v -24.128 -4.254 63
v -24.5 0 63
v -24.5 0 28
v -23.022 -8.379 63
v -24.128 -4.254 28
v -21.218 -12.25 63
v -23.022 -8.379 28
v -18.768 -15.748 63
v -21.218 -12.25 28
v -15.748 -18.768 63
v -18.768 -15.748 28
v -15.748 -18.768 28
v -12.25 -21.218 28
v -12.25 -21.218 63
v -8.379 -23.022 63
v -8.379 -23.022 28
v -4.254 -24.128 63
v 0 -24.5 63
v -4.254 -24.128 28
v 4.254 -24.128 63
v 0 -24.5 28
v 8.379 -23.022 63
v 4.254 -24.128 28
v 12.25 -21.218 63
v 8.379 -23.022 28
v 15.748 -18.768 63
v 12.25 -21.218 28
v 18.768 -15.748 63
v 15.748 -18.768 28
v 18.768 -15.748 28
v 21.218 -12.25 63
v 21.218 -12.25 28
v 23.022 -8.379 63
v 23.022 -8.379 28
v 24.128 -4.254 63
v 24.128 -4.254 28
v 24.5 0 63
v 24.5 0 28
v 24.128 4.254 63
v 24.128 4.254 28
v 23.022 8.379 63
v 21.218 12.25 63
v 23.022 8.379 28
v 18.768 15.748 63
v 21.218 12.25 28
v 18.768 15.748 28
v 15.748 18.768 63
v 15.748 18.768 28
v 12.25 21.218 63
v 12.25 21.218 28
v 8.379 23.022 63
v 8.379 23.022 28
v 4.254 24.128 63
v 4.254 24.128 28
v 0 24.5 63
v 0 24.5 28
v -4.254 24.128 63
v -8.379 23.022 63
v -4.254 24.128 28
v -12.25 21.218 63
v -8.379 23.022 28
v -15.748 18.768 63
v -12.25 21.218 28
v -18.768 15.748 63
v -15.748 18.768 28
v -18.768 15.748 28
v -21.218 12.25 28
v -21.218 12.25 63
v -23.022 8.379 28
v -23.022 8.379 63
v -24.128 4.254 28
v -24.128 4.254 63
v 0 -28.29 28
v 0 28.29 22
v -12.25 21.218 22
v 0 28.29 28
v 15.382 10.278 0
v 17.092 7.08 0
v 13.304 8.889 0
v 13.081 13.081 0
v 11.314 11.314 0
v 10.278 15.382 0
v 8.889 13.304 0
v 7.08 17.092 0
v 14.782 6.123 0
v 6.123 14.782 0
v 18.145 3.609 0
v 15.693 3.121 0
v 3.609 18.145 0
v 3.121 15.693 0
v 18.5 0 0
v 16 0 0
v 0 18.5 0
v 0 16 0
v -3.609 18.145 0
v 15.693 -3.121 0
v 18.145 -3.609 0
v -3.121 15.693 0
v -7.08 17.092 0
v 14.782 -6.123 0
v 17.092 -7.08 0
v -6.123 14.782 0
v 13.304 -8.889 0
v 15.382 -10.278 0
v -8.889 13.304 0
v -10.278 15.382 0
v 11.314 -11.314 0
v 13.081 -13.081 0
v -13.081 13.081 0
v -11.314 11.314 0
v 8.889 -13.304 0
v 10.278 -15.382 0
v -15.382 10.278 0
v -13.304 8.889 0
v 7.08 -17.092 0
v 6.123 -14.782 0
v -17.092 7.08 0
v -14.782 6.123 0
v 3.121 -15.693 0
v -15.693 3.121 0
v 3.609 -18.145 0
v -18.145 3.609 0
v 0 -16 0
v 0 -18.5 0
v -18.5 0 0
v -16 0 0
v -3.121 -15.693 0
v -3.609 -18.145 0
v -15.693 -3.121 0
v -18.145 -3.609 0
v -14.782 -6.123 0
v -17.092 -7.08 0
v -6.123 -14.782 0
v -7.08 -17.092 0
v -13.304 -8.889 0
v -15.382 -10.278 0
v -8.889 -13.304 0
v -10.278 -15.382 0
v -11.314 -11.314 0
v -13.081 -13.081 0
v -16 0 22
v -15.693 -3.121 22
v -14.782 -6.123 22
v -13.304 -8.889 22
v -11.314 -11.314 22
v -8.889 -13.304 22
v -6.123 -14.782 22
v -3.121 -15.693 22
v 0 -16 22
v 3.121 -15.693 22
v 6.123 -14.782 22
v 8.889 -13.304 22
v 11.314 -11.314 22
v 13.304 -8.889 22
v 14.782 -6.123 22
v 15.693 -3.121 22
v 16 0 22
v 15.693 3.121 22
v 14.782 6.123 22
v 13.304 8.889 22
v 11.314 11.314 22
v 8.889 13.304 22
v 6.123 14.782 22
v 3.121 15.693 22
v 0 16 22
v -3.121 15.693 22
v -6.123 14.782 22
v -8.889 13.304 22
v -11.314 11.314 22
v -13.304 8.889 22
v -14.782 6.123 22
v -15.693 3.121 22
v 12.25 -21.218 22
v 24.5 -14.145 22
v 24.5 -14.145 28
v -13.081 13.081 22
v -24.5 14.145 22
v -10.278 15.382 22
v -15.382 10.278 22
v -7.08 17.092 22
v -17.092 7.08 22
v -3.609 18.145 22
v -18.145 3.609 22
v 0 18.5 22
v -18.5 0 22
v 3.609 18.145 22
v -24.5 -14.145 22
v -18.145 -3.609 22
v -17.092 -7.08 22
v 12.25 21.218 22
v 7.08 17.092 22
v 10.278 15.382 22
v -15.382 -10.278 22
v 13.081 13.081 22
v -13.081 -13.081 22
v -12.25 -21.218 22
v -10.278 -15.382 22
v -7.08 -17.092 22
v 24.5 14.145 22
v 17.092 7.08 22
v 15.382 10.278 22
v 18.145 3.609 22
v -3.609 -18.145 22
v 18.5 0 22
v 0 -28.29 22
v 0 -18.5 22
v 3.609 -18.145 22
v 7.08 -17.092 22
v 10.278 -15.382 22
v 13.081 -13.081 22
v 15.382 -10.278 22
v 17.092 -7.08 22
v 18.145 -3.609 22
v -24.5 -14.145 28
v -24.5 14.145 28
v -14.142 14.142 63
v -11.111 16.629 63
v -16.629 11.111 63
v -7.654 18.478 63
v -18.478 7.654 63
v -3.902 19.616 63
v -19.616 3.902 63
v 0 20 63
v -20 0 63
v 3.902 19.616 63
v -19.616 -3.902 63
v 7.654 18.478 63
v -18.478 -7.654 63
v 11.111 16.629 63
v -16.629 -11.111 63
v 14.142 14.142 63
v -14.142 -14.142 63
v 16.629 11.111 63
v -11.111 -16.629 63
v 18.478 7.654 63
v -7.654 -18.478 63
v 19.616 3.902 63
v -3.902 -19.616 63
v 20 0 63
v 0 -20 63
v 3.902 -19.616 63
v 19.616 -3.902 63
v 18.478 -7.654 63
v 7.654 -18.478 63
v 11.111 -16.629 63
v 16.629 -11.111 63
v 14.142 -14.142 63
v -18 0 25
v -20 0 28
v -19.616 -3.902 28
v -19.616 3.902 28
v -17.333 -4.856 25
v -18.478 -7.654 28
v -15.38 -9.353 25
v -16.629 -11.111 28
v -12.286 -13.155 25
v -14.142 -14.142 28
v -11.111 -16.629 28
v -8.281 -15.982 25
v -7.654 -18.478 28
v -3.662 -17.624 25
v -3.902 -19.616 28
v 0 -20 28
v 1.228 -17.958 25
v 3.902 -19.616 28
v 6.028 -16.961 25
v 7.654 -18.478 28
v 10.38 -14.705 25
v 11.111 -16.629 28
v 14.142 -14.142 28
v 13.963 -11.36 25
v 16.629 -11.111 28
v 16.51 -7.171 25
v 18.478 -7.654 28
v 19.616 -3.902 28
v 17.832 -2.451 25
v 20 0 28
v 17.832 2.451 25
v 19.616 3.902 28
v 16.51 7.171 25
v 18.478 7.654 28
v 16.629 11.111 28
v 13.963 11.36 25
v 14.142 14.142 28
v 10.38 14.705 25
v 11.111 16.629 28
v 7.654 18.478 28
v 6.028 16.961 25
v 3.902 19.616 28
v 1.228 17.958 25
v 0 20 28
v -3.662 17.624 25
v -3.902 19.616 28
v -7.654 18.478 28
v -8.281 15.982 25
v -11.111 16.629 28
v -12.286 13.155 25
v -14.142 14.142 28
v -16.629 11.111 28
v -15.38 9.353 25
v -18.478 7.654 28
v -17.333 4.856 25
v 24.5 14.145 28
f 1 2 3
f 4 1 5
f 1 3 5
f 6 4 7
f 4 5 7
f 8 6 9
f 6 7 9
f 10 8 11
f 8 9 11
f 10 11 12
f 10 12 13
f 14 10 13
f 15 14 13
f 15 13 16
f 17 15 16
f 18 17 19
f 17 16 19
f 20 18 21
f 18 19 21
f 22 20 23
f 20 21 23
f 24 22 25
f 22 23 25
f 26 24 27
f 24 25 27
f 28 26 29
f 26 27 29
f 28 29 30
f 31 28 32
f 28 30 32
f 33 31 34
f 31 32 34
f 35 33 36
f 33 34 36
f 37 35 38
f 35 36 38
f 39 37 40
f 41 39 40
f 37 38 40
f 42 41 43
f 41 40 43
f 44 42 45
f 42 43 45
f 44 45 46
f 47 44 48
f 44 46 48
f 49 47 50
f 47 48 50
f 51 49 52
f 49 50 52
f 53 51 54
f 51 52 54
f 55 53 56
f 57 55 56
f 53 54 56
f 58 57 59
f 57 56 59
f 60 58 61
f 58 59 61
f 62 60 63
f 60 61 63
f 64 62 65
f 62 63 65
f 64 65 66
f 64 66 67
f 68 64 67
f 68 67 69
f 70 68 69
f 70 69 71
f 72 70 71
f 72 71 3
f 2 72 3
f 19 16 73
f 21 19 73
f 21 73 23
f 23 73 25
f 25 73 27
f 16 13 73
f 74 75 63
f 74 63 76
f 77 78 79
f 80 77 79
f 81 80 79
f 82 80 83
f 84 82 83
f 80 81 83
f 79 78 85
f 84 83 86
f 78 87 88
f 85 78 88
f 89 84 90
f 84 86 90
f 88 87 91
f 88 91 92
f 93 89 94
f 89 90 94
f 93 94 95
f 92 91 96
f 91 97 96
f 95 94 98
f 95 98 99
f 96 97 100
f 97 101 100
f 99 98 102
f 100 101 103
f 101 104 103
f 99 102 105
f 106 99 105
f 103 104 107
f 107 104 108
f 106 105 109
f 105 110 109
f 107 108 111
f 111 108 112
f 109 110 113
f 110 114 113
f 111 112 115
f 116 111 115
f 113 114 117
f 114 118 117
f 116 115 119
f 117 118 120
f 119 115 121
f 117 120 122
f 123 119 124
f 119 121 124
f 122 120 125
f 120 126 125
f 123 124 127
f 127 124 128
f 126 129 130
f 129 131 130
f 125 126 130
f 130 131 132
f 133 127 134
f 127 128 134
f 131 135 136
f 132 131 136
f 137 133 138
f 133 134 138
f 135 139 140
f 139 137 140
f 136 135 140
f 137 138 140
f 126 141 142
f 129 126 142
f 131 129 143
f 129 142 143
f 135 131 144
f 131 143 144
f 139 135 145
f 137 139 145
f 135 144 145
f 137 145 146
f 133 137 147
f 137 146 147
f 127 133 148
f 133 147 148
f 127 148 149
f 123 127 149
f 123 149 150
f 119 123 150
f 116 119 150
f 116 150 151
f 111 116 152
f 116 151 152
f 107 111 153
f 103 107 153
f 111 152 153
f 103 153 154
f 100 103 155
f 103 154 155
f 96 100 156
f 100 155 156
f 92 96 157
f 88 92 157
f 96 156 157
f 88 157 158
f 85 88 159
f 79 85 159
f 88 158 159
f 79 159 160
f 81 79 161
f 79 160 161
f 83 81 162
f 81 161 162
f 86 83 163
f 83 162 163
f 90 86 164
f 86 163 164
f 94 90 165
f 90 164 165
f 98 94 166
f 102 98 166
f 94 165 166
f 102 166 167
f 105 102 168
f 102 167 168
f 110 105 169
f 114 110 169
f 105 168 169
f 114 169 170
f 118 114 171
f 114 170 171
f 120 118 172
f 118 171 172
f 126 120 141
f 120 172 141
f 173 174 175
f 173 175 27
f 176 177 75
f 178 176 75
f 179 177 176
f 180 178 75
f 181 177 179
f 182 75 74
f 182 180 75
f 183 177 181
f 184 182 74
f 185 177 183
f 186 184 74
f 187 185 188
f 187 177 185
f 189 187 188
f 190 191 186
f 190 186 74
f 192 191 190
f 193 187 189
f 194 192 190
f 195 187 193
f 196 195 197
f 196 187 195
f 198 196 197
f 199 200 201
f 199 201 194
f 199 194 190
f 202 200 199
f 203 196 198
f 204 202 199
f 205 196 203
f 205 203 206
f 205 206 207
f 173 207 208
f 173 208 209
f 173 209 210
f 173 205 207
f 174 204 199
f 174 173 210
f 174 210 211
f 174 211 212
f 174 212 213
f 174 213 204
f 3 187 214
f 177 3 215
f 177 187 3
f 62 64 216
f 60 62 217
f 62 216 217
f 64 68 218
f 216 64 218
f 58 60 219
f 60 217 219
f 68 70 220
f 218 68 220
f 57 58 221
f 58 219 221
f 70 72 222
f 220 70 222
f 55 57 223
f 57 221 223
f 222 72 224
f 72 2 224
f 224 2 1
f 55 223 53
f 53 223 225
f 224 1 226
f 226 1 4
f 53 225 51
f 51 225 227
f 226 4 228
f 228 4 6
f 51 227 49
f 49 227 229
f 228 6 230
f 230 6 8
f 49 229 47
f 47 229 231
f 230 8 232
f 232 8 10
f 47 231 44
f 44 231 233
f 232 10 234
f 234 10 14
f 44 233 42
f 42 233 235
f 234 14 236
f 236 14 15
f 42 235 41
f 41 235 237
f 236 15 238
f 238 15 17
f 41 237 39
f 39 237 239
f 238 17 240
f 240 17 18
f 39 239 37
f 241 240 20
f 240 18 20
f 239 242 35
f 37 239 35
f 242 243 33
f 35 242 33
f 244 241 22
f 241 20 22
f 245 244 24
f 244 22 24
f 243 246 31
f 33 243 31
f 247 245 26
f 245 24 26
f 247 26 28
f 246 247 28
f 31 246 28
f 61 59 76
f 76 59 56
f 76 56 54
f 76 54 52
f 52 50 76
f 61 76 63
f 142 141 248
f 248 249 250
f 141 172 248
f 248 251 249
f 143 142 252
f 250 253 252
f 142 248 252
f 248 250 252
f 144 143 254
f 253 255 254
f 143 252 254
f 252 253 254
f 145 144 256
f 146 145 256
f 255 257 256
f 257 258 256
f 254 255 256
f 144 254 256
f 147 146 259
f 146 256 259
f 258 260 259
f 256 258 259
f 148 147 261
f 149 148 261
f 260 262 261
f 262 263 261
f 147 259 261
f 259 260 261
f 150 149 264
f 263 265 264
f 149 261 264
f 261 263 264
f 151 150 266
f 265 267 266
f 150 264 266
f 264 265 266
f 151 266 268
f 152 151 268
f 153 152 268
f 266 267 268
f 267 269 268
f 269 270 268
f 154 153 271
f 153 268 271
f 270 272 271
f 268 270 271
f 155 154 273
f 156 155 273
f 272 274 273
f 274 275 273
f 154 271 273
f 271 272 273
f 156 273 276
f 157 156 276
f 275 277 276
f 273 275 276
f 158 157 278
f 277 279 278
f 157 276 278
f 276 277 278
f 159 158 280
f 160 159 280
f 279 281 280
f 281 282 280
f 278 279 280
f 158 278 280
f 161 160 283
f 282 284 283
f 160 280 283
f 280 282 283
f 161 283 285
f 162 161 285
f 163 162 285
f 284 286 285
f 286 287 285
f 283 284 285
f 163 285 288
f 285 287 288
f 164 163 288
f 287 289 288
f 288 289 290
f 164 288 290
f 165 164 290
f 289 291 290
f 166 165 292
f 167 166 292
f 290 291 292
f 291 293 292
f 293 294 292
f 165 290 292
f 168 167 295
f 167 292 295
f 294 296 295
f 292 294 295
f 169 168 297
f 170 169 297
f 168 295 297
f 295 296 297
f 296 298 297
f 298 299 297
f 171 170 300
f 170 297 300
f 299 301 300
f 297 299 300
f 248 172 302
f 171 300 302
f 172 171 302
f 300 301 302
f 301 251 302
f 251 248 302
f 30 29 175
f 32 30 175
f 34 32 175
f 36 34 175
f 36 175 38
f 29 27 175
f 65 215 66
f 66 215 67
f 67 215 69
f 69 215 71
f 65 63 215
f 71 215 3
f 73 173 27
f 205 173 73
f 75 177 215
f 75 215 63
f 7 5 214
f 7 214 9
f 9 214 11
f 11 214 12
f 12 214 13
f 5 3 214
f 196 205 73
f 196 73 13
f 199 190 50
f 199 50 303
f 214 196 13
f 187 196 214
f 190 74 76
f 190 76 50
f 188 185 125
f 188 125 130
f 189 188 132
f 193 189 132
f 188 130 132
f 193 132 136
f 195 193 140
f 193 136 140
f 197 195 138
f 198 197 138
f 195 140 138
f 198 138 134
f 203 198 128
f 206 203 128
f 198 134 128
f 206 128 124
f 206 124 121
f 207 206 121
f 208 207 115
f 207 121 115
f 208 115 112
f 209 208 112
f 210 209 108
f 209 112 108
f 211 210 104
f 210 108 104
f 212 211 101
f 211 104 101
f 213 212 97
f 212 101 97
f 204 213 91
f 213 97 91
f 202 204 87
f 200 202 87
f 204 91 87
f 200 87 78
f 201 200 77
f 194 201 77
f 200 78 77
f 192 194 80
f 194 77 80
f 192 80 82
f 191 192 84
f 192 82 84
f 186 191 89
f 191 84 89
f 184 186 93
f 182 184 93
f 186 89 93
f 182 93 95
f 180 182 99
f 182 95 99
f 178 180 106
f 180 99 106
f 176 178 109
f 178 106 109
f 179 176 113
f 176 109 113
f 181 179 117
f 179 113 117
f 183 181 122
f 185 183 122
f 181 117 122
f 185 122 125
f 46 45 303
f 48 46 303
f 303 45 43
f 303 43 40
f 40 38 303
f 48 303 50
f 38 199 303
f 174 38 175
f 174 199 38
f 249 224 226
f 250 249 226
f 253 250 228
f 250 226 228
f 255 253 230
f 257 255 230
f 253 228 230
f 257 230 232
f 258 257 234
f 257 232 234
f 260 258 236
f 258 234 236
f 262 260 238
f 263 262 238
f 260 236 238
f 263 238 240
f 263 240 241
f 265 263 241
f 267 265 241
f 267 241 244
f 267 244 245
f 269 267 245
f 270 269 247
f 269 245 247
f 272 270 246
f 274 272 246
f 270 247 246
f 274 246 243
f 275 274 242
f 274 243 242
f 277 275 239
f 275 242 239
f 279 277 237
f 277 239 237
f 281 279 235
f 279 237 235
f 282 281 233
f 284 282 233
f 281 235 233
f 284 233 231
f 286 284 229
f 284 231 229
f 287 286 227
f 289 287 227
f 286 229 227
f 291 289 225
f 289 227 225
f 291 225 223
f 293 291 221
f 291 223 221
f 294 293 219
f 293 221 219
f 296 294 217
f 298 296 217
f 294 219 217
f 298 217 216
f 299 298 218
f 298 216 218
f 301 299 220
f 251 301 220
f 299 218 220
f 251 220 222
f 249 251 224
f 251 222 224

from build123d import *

# Parameters (mm, degrees)
F3_DEPTH = 6


with BuildPart() as f1:
    # F0 (on Front) → F1 (revolve)
    with BuildSketch(Plane.XZ):
        Polygon((-18.5, 0), (-16, 0), (-16, 22), (-20, 28), (-20, 63), (-24.5, 63), (-24.5, 28), (-24.5, 22), (-18.5, 22), align=None)
    revolve(axis=Axis((0, 0, 64.797089), (0, 0, 1)))

    # F2 (on face) → F3 (join)
    with BuildSketch(Plane(origin=(0, 0, 22), x_dir=(1, 0, 0), z_dir=(0, 0, -1))):
        with BuildLine():
            Line((24.5, -14.145082), (24.5, 0))
            ThreePointArc((24.5, 0), (21.217622, -12.25), (12.25, -21.217622))
            Line((12.25, -21.217622), (24.5, -14.145082))
        make_face()
        with BuildLine():
            ThreePointArc((12.25, 21.217622), (21.217622, 12.25), (24.5, 0))
            Line((24.5, 0), (24.5, 14.145082))
            Line((24.5, 14.145082), (12.25, 21.217622))
        make_face()
        with BuildLine():
            ThreePointArc((-12.249999, 21.217623), (0, 24.5), (12.25, 21.217622))
            Line((12.25, 21.217622), (0, 28.290163))
            Line((0, 28.290163), (-12.249999, 21.217623))
        make_face()
        with BuildLine():
            Line((0, -28.290163), (12.25, -21.217622))
            ThreePointArc((12.25, -21.217622), (0, -24.5), (-12.25, -21.217622))
            Line((-12.25, -21.217622), (0, -28.290163))
        make_face()
        with BuildLine():
            ThreePointArc((-24.5, 0), (-21.217622, 12.25), (-12.249999, 21.217623))
            Line((-12.249999, 21.217623), (-24.5, 14.145082))
            Line((-24.5, 14.145082), (-24.5, 0))
        make_face()
        with BuildLine():
            Line((-24.5, -14.145082), (-12.25, -21.217622))
            ThreePointArc((-12.25, -21.217622), (-21.217622, -12.25), (-24.5, 0))
            Line((-24.5, 0), (-24.5, -14.145082))
        make_face()
    extrude(amount=-F3_DEPTH)

    # F4 (on Front) → F5 (revolve, cut)
    with BuildSketch(Plane.XZ):
        Polygon((-20, 28), (-16, 22), (0, 22), (0, 28), (-12.25, 28), align=None)
    revolve(axis=Axis((0, 0, 34.552477), (0, 0, 1)), mode=Mode.SUBTRACT)


solid = f1.part
